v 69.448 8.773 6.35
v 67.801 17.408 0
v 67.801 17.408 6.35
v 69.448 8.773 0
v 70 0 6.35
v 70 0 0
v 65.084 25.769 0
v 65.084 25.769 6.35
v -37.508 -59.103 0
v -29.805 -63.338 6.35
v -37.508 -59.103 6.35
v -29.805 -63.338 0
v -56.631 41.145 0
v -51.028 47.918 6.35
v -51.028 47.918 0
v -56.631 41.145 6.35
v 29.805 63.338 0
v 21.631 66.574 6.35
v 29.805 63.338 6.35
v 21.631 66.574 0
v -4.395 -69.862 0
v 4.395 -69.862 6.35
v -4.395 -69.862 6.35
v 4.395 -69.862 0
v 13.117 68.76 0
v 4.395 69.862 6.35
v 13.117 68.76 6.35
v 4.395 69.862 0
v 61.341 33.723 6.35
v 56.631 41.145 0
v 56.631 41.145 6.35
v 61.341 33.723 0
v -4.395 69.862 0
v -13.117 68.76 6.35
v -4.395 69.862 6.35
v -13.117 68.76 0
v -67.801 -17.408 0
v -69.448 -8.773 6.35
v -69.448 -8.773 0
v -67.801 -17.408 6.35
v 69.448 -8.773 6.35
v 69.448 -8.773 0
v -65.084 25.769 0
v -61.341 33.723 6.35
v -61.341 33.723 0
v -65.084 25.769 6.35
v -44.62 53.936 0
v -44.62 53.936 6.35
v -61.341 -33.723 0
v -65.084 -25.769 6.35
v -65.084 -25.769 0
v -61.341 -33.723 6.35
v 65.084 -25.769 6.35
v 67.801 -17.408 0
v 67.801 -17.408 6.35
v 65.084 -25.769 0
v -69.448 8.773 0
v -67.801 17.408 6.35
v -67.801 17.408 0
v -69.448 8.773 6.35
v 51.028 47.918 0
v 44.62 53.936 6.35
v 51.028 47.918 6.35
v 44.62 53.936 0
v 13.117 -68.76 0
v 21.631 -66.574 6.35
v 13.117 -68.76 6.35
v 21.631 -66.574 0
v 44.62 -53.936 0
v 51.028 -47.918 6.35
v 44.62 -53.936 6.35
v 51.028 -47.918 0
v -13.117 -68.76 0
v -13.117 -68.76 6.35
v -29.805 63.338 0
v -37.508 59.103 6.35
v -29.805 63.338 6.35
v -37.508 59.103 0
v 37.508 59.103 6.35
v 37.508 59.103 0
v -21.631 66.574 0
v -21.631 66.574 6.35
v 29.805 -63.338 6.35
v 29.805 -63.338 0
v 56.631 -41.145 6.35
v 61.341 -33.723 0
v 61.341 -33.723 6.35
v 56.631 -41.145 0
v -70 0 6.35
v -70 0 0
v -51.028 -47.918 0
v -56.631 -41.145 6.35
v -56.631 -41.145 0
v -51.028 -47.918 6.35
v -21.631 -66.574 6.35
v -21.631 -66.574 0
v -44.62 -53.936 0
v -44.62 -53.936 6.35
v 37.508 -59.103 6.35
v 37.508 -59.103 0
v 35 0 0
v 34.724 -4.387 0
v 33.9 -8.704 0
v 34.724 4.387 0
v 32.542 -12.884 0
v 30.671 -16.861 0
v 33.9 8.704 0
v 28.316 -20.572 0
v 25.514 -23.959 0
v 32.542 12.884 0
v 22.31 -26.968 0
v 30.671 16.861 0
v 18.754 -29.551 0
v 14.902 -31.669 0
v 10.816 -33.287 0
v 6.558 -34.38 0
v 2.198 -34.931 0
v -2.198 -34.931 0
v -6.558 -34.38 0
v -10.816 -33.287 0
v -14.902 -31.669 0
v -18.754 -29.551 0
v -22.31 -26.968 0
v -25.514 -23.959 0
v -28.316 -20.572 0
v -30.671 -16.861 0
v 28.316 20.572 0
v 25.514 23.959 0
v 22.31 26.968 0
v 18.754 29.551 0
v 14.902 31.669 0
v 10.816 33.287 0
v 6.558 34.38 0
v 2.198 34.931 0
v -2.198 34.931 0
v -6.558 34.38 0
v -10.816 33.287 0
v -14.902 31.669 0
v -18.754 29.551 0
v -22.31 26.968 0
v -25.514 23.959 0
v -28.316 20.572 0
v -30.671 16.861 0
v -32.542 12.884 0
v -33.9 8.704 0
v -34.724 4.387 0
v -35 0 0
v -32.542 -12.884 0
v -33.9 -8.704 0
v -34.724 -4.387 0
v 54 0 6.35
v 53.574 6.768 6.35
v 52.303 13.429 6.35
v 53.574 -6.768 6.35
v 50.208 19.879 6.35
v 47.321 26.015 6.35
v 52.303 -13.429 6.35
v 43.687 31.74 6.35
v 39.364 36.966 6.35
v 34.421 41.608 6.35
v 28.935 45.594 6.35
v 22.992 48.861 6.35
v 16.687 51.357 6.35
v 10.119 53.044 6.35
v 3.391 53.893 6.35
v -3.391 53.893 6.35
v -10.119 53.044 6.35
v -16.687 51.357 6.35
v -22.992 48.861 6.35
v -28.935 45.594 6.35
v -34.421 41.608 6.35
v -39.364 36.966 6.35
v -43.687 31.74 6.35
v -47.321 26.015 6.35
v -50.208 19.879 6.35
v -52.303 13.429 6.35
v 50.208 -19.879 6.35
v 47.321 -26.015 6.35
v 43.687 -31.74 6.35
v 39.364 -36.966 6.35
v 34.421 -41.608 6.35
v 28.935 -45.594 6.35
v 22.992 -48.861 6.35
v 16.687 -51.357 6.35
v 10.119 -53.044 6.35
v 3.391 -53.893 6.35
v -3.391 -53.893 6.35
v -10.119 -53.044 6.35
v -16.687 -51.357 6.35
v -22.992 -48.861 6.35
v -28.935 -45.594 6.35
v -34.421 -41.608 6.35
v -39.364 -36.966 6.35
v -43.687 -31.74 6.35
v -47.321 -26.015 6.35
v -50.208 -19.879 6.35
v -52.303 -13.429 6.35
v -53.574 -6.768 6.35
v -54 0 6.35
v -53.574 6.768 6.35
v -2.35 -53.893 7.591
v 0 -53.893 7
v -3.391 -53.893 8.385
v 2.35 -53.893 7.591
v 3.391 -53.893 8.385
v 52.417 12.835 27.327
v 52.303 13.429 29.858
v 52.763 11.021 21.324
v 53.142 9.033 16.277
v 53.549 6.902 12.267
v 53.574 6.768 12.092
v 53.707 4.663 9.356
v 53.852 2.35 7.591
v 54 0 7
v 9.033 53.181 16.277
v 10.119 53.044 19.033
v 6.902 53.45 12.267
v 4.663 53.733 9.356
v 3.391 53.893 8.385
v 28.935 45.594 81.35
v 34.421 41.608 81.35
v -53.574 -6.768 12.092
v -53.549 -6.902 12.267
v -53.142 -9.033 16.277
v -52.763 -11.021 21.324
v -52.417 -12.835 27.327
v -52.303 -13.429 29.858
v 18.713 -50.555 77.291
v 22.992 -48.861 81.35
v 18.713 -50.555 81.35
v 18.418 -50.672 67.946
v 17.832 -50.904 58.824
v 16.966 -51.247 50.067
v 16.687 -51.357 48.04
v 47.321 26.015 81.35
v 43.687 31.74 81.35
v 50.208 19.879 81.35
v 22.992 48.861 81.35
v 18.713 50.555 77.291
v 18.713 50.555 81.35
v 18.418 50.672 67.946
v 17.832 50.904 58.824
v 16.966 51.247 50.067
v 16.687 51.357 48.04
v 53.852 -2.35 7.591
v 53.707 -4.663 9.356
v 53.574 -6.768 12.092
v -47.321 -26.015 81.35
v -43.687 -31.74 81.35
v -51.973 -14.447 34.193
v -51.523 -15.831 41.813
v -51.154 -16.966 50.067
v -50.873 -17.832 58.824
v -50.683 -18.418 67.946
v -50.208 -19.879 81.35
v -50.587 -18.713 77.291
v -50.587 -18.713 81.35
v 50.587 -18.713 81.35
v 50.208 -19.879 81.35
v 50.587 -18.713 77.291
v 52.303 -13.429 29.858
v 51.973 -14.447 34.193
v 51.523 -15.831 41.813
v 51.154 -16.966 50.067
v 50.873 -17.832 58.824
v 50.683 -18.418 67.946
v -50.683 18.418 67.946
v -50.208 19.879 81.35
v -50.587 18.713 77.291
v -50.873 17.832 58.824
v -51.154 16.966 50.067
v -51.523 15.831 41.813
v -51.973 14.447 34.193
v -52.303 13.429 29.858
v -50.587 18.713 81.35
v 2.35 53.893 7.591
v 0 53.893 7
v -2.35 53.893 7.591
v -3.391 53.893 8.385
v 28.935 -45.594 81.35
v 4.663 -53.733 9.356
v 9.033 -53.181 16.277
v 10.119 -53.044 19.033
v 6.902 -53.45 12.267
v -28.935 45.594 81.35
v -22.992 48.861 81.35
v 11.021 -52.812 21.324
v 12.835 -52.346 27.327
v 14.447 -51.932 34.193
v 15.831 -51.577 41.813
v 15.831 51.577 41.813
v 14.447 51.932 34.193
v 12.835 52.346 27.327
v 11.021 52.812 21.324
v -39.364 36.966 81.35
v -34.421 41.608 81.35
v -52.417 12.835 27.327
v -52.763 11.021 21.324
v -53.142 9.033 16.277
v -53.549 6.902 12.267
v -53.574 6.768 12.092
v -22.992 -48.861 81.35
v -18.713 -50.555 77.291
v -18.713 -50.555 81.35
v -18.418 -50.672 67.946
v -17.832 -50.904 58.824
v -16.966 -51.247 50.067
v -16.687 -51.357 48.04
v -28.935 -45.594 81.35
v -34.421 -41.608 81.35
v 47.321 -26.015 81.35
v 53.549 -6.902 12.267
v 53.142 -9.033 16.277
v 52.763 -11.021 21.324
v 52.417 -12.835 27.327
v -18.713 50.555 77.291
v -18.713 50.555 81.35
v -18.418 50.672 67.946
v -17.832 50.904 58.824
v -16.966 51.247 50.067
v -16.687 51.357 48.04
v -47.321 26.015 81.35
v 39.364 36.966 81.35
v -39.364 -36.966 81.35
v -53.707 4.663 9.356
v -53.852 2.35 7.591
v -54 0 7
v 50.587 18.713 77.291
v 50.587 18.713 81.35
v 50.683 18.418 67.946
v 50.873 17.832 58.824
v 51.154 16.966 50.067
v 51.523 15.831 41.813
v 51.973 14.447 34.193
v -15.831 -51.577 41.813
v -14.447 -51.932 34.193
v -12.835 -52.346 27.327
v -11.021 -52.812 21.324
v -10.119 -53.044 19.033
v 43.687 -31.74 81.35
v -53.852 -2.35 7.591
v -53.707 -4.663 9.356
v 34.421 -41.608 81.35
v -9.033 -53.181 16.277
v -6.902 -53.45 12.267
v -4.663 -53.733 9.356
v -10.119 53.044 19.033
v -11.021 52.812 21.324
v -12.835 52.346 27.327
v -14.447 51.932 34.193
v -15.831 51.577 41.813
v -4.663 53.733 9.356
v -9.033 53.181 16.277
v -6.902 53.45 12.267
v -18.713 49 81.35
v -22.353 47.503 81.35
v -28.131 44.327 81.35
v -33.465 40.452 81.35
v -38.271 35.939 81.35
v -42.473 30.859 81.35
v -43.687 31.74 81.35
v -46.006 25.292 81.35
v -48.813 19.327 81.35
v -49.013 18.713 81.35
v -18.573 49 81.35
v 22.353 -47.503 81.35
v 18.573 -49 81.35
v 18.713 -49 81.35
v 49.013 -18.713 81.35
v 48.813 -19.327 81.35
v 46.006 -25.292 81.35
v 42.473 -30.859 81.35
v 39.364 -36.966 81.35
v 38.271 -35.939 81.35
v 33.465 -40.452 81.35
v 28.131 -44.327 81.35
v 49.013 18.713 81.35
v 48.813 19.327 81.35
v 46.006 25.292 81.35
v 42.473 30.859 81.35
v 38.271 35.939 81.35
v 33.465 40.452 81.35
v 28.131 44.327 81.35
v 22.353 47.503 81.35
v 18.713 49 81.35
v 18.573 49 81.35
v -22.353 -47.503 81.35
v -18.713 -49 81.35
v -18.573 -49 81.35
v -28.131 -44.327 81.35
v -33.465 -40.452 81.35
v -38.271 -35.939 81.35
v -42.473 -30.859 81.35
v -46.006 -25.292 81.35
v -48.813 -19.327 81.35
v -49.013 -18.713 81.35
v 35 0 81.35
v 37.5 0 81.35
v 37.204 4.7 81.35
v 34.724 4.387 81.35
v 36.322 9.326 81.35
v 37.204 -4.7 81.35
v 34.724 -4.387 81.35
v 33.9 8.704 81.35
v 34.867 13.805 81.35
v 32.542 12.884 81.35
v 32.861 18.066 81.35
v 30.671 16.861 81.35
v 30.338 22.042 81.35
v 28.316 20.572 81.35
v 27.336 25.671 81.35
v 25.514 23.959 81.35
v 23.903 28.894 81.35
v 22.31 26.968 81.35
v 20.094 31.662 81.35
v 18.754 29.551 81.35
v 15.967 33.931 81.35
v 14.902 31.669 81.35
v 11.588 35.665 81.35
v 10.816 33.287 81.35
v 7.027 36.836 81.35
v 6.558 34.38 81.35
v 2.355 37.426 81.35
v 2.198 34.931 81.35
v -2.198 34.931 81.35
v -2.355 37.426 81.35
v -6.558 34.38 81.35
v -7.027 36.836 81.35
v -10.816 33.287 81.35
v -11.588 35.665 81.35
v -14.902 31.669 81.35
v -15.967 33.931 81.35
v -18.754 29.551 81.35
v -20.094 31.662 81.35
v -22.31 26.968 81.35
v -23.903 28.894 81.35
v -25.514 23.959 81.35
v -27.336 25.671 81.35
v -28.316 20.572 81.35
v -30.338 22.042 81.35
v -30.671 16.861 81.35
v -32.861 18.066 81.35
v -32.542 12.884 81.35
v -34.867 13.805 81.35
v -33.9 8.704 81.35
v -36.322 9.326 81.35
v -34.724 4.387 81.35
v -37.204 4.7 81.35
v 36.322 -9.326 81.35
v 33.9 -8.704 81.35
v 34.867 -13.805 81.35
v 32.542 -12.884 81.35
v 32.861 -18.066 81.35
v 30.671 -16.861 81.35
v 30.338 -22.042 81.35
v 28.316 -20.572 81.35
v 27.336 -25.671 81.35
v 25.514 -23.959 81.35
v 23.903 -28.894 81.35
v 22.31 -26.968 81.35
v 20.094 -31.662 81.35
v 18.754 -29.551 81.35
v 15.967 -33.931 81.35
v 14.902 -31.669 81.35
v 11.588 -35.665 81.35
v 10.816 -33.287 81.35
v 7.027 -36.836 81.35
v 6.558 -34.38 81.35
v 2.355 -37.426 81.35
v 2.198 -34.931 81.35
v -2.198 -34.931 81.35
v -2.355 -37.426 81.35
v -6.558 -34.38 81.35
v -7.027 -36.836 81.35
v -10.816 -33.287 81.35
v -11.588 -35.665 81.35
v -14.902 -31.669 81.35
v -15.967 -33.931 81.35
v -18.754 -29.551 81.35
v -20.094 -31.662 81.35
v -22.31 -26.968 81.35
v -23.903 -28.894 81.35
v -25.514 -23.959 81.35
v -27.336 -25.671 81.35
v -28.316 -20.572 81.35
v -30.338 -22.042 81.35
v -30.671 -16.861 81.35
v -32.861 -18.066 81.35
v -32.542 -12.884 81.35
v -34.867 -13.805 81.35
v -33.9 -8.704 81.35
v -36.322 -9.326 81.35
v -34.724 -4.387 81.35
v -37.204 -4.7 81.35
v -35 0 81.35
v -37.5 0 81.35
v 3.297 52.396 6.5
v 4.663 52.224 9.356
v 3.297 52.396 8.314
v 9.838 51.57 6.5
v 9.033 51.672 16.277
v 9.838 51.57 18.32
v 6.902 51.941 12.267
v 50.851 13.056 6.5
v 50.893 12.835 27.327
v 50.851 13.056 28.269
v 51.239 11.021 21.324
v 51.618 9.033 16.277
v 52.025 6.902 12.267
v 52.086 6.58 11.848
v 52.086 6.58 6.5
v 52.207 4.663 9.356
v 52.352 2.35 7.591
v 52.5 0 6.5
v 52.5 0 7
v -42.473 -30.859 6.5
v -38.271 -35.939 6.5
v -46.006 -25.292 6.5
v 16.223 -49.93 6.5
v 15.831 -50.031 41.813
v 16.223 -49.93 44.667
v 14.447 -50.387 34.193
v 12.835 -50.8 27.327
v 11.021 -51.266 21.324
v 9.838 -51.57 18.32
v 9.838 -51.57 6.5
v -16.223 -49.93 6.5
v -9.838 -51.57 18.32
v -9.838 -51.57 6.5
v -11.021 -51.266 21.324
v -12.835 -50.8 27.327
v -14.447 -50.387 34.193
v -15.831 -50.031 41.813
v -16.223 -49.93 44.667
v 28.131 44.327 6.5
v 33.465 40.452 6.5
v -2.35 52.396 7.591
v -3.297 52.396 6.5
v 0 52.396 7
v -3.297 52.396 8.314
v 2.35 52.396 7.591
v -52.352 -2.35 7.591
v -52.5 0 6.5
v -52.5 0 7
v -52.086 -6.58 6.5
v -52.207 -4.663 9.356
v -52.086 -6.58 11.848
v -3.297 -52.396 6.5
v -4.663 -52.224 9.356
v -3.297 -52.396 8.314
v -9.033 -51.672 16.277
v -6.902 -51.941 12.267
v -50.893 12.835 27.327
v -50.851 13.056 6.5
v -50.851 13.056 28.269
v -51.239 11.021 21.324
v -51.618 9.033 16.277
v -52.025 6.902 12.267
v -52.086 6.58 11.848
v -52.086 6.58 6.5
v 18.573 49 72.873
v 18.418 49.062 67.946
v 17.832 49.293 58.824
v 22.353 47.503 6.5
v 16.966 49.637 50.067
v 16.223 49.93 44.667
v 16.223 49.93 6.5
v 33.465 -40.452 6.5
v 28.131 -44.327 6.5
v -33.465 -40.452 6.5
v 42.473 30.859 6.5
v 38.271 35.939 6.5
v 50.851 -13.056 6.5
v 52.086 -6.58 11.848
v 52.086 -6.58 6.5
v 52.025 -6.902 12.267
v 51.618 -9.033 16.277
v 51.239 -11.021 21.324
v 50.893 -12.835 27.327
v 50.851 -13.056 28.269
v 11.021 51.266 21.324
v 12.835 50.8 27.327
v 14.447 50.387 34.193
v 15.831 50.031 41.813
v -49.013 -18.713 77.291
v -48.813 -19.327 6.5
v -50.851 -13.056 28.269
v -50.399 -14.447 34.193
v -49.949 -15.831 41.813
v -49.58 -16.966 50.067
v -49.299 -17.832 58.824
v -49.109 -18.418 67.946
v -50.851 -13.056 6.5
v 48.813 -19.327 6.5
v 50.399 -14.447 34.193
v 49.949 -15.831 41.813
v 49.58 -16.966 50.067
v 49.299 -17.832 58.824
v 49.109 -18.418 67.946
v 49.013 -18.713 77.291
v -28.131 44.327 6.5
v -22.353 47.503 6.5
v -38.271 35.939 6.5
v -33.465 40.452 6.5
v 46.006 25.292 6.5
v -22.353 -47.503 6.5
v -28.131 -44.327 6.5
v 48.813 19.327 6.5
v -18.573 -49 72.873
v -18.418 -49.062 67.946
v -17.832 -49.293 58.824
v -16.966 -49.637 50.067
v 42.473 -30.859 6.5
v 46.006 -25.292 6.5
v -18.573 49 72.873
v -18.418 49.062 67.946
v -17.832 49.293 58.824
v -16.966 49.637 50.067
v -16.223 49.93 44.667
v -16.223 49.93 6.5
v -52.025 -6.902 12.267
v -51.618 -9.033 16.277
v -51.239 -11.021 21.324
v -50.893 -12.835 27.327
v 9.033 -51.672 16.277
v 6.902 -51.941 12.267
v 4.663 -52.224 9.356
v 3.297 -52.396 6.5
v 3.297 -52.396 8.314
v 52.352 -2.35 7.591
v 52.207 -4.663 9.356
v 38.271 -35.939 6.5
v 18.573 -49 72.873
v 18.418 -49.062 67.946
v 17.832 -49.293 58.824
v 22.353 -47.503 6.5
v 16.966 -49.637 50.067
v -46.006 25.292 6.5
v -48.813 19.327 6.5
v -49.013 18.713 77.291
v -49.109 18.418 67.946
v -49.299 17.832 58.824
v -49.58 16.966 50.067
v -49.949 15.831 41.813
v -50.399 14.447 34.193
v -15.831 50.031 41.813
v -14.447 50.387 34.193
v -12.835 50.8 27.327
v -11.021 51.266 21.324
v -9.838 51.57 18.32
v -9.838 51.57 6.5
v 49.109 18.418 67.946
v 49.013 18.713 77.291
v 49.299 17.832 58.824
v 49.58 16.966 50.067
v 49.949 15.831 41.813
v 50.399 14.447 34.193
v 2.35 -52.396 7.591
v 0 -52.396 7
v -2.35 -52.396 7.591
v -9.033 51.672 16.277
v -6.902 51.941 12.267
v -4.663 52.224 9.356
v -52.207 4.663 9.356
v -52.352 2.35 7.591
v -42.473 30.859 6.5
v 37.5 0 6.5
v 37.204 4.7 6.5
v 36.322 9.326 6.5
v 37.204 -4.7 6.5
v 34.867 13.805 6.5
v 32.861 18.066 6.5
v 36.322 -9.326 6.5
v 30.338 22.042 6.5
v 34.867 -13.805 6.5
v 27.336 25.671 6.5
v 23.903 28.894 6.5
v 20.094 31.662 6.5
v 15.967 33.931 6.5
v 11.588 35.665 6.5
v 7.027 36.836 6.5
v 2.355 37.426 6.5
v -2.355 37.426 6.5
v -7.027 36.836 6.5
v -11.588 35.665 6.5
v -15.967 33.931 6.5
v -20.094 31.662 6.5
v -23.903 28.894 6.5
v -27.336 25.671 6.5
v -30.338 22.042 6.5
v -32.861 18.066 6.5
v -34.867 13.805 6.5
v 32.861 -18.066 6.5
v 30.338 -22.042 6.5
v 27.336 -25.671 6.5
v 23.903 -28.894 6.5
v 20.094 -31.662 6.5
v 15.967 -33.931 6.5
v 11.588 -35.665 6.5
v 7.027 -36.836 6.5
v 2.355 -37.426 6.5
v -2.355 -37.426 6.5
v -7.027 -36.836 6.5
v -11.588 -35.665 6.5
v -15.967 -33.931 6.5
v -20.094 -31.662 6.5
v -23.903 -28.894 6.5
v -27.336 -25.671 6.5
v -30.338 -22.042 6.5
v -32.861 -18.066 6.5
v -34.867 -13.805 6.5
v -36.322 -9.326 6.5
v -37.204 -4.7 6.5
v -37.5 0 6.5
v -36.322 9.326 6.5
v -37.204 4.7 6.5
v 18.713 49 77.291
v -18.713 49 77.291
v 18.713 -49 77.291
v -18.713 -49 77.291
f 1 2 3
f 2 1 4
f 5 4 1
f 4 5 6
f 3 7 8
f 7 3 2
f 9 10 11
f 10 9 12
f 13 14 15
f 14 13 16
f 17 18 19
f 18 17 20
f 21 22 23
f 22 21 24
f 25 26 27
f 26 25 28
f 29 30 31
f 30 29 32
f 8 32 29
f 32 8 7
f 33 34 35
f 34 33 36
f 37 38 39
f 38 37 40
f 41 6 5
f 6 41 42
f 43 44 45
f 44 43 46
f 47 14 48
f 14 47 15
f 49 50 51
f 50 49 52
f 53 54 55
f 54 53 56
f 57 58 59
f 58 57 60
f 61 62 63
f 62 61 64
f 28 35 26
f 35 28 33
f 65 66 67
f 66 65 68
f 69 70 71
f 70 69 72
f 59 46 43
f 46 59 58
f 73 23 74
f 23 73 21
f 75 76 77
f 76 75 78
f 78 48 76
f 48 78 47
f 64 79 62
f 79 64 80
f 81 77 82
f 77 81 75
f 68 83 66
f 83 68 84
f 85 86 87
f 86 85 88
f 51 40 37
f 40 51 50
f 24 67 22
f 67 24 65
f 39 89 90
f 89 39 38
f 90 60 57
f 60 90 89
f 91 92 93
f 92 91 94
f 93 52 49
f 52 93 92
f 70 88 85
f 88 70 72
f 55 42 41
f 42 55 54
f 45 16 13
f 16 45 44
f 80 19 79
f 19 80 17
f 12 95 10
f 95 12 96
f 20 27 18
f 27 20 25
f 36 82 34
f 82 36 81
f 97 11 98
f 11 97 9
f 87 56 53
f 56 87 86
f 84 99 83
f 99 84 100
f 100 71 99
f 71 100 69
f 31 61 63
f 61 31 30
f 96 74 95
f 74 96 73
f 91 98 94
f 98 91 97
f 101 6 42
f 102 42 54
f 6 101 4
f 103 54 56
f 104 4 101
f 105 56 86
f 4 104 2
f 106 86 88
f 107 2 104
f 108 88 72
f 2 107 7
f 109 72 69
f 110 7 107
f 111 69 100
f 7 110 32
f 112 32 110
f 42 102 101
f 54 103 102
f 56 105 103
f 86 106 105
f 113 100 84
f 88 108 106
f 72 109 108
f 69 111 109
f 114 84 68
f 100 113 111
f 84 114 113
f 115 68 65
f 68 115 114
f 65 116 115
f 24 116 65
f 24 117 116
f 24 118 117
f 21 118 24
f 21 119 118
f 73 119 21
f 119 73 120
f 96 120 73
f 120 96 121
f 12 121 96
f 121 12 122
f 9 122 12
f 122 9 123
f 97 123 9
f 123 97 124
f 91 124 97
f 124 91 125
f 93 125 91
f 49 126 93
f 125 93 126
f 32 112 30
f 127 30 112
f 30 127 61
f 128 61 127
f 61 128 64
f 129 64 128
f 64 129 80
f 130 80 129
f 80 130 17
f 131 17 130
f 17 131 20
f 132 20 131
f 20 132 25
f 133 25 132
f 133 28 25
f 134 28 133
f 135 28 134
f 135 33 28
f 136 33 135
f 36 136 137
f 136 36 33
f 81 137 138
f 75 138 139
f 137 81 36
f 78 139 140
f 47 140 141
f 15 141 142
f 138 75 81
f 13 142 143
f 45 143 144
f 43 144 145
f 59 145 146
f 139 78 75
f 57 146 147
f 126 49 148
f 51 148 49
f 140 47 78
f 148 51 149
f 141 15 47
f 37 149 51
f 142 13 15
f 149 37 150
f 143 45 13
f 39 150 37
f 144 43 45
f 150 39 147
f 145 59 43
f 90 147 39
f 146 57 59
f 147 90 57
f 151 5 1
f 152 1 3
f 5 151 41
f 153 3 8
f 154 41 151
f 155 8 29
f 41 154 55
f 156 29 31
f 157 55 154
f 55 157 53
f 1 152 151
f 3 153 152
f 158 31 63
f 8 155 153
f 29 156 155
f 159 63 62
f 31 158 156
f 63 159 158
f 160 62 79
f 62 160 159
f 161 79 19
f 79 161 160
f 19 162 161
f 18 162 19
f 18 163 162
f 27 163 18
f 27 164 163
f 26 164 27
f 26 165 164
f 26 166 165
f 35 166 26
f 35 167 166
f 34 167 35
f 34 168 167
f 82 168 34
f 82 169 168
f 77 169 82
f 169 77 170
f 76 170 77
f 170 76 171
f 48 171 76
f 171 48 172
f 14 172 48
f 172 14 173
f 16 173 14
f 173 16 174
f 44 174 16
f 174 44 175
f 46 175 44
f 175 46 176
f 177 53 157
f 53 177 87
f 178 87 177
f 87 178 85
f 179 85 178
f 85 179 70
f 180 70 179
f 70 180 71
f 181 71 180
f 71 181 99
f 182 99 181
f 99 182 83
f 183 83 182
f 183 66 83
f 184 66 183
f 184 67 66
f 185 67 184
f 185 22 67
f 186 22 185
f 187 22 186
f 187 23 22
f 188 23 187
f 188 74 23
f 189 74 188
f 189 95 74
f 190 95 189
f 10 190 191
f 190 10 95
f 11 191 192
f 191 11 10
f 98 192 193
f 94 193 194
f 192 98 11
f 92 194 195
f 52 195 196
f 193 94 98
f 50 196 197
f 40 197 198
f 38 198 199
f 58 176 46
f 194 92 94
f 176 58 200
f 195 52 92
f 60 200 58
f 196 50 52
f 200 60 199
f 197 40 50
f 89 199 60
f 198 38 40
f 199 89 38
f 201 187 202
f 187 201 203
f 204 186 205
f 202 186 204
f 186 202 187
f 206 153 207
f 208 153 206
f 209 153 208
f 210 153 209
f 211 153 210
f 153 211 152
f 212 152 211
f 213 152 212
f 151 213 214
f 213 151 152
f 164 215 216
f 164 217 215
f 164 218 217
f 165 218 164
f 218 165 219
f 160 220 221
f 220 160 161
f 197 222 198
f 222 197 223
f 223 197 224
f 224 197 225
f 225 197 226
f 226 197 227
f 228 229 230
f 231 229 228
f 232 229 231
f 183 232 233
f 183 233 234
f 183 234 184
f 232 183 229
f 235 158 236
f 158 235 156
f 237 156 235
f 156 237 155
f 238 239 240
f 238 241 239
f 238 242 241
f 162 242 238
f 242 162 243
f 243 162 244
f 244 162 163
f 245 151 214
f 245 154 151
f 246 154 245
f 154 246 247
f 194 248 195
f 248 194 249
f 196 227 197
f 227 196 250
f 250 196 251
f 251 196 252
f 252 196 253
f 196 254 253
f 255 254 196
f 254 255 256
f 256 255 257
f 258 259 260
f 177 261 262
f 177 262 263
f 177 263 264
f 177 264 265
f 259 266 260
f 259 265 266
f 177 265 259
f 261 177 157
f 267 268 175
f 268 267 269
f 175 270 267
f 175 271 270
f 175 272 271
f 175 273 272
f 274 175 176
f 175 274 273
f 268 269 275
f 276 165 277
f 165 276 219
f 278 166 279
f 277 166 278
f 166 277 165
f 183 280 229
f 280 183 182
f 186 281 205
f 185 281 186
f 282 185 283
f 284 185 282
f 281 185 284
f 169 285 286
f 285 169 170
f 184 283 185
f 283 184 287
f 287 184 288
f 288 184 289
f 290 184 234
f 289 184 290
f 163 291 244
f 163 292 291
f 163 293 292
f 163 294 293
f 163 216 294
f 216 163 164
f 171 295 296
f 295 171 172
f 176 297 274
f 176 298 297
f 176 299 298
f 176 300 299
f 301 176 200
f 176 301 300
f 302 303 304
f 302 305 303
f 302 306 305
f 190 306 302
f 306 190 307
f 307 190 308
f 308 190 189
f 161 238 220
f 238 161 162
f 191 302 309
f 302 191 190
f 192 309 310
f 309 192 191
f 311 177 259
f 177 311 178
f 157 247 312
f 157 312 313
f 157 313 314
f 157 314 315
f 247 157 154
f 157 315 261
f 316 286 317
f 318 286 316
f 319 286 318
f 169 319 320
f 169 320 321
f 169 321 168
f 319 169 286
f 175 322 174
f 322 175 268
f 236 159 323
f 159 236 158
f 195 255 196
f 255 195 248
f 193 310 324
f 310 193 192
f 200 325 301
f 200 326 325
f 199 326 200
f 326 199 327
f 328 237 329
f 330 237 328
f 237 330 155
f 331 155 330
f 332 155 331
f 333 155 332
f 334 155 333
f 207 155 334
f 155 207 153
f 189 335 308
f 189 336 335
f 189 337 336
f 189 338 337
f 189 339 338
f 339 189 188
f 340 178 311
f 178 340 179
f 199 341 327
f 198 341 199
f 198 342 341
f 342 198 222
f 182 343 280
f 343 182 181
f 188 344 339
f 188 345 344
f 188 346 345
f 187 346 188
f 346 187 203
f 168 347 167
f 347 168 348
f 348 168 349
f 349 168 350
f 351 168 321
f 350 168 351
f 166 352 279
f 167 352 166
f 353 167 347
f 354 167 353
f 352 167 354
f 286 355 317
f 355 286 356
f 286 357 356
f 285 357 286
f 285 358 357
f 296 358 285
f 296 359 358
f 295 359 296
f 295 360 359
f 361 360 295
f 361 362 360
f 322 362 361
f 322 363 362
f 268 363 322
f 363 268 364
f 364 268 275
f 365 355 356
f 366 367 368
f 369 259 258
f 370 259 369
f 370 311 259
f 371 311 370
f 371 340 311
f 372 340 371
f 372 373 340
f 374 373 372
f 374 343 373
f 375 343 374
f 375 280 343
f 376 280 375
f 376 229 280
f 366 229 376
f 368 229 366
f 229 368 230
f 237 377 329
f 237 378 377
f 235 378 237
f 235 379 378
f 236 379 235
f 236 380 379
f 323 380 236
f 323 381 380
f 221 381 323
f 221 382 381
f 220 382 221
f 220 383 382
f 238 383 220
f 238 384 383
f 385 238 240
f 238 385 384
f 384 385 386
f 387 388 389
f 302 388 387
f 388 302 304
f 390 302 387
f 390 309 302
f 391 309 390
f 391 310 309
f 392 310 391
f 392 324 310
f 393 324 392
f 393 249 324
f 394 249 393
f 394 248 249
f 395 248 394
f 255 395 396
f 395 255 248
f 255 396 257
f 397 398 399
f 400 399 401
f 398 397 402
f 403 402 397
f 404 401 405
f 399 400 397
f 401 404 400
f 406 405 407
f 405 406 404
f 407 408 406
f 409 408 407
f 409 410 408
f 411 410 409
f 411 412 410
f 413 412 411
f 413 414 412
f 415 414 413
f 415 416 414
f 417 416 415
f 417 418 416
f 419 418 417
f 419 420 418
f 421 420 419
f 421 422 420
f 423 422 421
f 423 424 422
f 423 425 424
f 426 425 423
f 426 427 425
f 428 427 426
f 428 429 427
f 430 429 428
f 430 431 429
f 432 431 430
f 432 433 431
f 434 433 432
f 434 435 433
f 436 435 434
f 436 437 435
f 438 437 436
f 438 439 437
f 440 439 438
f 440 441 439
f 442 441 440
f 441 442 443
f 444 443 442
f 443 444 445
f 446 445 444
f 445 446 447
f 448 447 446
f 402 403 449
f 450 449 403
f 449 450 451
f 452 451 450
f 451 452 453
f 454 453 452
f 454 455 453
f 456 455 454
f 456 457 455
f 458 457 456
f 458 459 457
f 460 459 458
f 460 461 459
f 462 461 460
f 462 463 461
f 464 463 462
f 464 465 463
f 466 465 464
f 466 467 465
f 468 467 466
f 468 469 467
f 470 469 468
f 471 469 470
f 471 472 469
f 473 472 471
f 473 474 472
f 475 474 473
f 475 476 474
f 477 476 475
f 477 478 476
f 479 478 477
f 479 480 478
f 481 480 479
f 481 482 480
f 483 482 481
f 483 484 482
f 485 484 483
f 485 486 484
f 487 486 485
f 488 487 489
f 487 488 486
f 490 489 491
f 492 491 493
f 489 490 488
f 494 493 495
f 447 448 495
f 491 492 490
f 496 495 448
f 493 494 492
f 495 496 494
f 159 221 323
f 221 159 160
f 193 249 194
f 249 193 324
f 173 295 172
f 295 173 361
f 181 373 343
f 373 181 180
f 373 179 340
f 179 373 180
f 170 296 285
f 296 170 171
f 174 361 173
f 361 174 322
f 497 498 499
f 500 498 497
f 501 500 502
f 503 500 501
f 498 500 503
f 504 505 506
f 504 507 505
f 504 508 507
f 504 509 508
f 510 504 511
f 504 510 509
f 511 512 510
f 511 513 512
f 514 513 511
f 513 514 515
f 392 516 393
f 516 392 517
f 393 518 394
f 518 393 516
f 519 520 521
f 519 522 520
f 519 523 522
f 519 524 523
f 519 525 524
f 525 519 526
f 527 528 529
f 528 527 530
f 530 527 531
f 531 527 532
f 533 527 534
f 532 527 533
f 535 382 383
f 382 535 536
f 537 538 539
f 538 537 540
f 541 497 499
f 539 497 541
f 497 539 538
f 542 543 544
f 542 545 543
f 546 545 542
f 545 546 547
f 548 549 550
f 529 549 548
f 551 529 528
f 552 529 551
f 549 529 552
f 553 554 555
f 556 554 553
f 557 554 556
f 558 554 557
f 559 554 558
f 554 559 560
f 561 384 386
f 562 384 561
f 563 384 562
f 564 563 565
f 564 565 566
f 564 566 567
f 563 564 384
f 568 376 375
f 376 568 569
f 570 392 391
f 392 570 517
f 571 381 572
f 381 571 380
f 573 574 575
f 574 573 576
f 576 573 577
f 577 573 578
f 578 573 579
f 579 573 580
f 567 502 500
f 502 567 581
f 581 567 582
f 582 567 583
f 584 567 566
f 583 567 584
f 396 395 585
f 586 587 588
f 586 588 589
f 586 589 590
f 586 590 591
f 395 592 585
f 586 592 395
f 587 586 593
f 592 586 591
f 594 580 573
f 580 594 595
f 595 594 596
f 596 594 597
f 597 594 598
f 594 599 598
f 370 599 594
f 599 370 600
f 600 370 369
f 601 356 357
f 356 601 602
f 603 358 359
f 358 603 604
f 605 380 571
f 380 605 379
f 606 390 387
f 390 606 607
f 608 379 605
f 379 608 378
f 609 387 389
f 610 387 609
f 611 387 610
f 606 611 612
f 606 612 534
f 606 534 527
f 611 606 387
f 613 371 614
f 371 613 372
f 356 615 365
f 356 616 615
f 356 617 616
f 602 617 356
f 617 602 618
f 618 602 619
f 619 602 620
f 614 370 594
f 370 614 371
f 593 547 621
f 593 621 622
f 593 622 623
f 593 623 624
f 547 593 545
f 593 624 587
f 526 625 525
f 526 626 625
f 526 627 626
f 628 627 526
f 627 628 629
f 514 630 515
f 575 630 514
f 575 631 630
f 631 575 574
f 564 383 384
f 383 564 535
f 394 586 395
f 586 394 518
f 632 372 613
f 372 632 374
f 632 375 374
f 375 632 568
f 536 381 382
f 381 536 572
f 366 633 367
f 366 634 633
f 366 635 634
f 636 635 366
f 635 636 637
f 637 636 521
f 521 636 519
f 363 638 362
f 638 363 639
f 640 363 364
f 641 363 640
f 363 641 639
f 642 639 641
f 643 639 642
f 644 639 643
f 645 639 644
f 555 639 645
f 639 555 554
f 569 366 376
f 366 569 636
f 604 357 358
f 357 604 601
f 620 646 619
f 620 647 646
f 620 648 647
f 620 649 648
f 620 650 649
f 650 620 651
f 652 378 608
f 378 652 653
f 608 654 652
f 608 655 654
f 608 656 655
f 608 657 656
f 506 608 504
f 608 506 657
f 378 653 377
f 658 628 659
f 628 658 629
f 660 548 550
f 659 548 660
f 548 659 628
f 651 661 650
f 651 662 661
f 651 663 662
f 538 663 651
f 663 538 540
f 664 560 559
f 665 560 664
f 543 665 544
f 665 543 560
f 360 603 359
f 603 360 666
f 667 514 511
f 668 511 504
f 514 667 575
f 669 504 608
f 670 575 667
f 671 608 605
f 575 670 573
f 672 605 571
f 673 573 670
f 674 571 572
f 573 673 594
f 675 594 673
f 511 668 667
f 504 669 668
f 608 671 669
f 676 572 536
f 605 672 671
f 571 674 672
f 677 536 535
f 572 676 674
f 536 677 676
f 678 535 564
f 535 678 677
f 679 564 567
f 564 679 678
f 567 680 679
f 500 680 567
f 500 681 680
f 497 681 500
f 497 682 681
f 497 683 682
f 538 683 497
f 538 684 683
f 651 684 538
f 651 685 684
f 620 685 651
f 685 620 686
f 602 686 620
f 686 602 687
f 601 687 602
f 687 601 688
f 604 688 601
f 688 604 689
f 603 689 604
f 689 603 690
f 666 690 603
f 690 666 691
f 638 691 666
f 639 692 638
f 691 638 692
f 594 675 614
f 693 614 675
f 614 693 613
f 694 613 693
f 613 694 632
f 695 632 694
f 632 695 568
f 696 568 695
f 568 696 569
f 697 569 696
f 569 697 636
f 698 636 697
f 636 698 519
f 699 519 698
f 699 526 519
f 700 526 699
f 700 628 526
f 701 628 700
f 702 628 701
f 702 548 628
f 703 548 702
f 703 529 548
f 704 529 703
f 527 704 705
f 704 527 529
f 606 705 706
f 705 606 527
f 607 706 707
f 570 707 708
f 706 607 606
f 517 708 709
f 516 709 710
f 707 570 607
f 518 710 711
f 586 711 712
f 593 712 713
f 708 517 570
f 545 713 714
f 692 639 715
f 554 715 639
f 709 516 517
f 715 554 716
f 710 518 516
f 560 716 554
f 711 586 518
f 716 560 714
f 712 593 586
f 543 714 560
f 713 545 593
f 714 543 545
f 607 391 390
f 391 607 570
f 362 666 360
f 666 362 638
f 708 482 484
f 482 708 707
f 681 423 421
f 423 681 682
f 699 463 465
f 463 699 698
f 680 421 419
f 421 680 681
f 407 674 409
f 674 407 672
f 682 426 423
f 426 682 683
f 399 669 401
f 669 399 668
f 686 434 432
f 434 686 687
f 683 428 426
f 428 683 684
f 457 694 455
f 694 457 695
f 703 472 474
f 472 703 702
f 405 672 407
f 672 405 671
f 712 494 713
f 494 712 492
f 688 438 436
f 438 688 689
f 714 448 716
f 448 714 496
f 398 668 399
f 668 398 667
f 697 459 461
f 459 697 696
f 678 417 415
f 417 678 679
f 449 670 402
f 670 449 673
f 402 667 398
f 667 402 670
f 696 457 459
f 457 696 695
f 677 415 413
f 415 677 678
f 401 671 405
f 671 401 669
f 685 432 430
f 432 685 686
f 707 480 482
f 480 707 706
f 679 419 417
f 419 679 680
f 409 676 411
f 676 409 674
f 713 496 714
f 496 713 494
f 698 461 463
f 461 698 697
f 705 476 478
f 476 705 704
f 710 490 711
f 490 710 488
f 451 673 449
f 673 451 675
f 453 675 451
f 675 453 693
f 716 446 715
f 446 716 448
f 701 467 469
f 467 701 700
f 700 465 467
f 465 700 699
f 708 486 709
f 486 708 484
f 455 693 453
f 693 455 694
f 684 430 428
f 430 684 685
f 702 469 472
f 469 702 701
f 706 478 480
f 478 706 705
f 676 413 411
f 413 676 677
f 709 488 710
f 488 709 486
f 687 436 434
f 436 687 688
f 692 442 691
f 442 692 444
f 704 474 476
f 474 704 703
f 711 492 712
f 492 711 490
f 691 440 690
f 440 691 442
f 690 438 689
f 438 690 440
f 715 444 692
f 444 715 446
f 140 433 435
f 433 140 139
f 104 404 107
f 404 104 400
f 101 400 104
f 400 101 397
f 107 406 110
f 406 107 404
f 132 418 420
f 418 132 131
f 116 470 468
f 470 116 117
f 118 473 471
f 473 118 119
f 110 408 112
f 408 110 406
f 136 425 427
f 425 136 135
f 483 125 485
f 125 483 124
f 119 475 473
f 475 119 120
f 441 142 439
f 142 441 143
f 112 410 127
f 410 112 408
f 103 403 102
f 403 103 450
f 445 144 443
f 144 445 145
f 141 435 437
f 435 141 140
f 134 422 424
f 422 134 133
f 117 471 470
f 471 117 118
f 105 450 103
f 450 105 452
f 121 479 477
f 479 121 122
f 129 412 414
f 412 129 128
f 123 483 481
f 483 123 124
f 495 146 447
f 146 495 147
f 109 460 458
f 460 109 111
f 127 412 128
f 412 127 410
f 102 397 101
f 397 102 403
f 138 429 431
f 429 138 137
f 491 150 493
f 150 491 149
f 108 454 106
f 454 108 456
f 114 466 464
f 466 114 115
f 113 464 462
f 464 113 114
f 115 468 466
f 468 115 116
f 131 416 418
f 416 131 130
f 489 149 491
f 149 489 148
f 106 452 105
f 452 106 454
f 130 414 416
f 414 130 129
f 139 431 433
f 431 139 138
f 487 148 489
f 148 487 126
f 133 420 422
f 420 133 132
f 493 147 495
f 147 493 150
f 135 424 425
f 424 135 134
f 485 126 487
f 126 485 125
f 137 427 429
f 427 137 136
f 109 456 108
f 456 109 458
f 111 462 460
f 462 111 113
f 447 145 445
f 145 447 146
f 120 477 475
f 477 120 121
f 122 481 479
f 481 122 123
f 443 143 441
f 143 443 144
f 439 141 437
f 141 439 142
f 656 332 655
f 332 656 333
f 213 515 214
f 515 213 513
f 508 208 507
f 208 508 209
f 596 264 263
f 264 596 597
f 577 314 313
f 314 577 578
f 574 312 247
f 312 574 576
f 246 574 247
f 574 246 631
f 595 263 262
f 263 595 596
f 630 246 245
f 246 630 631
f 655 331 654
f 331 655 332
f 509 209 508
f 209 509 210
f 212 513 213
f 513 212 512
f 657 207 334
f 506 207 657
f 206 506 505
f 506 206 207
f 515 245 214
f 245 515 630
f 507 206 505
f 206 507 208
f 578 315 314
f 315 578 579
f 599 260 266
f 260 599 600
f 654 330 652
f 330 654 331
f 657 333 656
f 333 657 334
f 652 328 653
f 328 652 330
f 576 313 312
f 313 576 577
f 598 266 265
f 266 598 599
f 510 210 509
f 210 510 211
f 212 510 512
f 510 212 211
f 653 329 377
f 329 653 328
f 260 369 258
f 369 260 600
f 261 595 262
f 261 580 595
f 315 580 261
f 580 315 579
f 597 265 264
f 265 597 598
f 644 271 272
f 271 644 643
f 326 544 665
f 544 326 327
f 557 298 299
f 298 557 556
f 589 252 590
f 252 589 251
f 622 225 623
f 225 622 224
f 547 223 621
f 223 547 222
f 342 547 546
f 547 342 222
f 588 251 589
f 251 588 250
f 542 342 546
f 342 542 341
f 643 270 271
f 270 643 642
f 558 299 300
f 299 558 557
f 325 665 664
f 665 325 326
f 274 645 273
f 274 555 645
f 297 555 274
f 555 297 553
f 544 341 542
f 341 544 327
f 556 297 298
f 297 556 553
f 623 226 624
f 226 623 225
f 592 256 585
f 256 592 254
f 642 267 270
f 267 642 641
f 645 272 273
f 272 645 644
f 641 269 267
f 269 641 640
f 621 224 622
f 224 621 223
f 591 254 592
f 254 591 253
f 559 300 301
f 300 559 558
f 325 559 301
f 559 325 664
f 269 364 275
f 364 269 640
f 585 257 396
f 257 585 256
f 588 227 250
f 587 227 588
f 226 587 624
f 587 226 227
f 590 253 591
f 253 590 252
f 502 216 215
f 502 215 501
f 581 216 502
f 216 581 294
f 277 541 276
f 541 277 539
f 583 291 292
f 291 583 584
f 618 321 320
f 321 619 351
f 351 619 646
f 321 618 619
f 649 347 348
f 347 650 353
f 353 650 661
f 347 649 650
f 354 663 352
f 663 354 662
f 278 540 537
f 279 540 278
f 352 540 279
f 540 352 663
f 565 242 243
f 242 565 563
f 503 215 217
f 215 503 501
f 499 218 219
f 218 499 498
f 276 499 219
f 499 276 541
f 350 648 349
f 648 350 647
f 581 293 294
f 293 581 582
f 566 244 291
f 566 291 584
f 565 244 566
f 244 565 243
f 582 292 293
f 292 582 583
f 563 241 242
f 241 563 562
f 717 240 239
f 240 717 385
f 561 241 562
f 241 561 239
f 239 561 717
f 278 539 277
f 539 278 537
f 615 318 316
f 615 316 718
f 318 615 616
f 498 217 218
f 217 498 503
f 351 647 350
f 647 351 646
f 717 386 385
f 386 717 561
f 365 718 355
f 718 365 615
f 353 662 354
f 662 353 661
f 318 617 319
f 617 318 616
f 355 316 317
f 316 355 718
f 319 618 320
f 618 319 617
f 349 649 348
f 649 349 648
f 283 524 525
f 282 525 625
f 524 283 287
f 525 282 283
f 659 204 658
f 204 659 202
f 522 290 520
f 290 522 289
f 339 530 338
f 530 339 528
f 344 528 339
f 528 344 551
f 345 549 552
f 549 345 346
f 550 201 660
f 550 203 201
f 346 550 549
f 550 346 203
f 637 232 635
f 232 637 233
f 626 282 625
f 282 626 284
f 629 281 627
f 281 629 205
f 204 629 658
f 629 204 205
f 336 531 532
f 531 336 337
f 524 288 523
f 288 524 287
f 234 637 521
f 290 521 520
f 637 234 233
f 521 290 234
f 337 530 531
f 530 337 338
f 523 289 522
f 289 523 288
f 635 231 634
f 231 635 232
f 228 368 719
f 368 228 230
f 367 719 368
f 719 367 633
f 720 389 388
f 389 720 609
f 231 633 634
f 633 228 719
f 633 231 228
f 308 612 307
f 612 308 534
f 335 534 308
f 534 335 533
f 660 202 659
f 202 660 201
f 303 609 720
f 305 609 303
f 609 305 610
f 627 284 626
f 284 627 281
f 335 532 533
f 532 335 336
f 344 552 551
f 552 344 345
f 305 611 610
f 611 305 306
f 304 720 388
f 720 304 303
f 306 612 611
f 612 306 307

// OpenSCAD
/* Open SCAD Name.: vinyl_stand_v1.scad
*  Copyright (c)..: 2017 www.DIY3DTech.com
*
*  Creation Date..: 11/26/2017
*  Description....: vinyl roll stand
*
*  Rev 1: Develop Model
*  Rev 2: 
*
*  This program is free software; you can redistribute it and/or modify
*  it under the terms of the GNU General Public License as published by
*  the Free Software Foundation; either version 2 of the License, or
*  (at your option) any later version.
*
*  This program is distributed in the hope that it will be useful,
*  but WITHOUT ANY WARRANTY; without even the implied warranty of
*  MERCHANTABILITY or FITNESS FOR A PARTICULAR PURPOSE.  See the
*  GNU General Public License for more details.
*/ 

/*------------------Customizer View-------------------*/

// preview[view:north, tilt:top]

/*---------------------Parameters---------------------*/


//inter-dia of outer tube in mm
tube_id         =   105; //[100:1:125]

//outer-dia of inter-tube in mm
tube_cen        =   75; //[50:1:75]

//height of holder in mm
tube_tall       =   75; //[50:1:100] 


/*-----------------------Execute----------------------*/

main_module();

/*-----------------------Modules----------------------*/

module main_module(){ //create module
    difference() {
            union() {//start union
                
                //created extended base to prevent tipping
                translate ([0,0,6.35/2]) rotate ([0,0,0]) cylinder(6.35,(tube_id+35)/2,(tube_id+35)/2,$fn=50,true);
                //create main body
                translate ([0,0,(tube_tall+6.35)/2]) rotate ([0,0,0]) cylinder(tube_tall+6.35,(tube_id+3)/2,(tube_id+3)/2,$fn=50,true);
                 
                        
                    } //end union
                    
                //remove center to save plastic and time 
                translate ([0,0,(tube_tall)/2]) rotate ([0,0,0]) cylinder(tube_tall+30,(tube_cen-5)/2,(tube_cen-5)/2,$fn=50,true);
                    
                 //knock out center   
                translate ([0,0,(tube_tall/2)+7]) rotate ([0,0,0]) knock_out(tube_id,tube_cen,tube_tall+1);
            
            //create flower like knockouts with oval    
            translate ([(tube_id/2)-1,0,(tube_tall)+7]) rotate ([0,90,0])    oval(tube_tall,tube_tall/4,5, center = true);
            translate ([-(tube_id/2)+1,0,(tube_tall)+7]) rotate ([0,90,0])    oval(tube_tall,tube_tall/4,5, center = true);
            translate ([0,(tube_id/2)-1,(tube_tall)+7]) rotate ([90,90,0])    oval(tube_tall,tube_tall/4,5, center = true);
            translate ([0,-(tube_id/2)+1,(tube_tall)+7]) rotate ([90,90,0])    oval(tube_tall,tube_tall/4,5, center = true);
                    
                           
    //start subtraction of difference
                                               
    } //end difference
}//end module

module knock_out(ko_od,ko_id,ko_tall){ //create module
    difference() {
            union() {//start union
                
                //create outer shell
                translate ([0,0,0]) rotate ([0,0,0]) cylinder(ko_tall,ko_od/2,ko_od/2,$fn=50,true);
                 
                        
                    } //end union
                            
    //start subtraction of difference
                 
                //create inter knockout
                translate ([0,0,(5/2)]) rotate ([0,0,0]) cylinder(ko_tall+5,ko_id/2,ko_id/2,$fn=50,true);
                                               
    } //end difference
}//end module

module oval(w,h, height, center = true) //create oval
    {
        scale([1, h/w, 1]) cylinder(h=height, r=w, $fn=50,center=center);
    }//end module

                 
/*----------------------End Code----------------------*/
//translate ([0,0,0]) rotate ([0,0,0]) cylinder(5,3,3,true);
//translate ([0,0,0]) rotate ([0,0,0]) cube([18,18,18],true);
//translate ([0,0,0]) sphere($fn = 0, $fa = 12, $fs = 2, r = 1);
//translate ([0,0,0]) rotate ([0,0,0]) rounded (15,15,1,1,true);
